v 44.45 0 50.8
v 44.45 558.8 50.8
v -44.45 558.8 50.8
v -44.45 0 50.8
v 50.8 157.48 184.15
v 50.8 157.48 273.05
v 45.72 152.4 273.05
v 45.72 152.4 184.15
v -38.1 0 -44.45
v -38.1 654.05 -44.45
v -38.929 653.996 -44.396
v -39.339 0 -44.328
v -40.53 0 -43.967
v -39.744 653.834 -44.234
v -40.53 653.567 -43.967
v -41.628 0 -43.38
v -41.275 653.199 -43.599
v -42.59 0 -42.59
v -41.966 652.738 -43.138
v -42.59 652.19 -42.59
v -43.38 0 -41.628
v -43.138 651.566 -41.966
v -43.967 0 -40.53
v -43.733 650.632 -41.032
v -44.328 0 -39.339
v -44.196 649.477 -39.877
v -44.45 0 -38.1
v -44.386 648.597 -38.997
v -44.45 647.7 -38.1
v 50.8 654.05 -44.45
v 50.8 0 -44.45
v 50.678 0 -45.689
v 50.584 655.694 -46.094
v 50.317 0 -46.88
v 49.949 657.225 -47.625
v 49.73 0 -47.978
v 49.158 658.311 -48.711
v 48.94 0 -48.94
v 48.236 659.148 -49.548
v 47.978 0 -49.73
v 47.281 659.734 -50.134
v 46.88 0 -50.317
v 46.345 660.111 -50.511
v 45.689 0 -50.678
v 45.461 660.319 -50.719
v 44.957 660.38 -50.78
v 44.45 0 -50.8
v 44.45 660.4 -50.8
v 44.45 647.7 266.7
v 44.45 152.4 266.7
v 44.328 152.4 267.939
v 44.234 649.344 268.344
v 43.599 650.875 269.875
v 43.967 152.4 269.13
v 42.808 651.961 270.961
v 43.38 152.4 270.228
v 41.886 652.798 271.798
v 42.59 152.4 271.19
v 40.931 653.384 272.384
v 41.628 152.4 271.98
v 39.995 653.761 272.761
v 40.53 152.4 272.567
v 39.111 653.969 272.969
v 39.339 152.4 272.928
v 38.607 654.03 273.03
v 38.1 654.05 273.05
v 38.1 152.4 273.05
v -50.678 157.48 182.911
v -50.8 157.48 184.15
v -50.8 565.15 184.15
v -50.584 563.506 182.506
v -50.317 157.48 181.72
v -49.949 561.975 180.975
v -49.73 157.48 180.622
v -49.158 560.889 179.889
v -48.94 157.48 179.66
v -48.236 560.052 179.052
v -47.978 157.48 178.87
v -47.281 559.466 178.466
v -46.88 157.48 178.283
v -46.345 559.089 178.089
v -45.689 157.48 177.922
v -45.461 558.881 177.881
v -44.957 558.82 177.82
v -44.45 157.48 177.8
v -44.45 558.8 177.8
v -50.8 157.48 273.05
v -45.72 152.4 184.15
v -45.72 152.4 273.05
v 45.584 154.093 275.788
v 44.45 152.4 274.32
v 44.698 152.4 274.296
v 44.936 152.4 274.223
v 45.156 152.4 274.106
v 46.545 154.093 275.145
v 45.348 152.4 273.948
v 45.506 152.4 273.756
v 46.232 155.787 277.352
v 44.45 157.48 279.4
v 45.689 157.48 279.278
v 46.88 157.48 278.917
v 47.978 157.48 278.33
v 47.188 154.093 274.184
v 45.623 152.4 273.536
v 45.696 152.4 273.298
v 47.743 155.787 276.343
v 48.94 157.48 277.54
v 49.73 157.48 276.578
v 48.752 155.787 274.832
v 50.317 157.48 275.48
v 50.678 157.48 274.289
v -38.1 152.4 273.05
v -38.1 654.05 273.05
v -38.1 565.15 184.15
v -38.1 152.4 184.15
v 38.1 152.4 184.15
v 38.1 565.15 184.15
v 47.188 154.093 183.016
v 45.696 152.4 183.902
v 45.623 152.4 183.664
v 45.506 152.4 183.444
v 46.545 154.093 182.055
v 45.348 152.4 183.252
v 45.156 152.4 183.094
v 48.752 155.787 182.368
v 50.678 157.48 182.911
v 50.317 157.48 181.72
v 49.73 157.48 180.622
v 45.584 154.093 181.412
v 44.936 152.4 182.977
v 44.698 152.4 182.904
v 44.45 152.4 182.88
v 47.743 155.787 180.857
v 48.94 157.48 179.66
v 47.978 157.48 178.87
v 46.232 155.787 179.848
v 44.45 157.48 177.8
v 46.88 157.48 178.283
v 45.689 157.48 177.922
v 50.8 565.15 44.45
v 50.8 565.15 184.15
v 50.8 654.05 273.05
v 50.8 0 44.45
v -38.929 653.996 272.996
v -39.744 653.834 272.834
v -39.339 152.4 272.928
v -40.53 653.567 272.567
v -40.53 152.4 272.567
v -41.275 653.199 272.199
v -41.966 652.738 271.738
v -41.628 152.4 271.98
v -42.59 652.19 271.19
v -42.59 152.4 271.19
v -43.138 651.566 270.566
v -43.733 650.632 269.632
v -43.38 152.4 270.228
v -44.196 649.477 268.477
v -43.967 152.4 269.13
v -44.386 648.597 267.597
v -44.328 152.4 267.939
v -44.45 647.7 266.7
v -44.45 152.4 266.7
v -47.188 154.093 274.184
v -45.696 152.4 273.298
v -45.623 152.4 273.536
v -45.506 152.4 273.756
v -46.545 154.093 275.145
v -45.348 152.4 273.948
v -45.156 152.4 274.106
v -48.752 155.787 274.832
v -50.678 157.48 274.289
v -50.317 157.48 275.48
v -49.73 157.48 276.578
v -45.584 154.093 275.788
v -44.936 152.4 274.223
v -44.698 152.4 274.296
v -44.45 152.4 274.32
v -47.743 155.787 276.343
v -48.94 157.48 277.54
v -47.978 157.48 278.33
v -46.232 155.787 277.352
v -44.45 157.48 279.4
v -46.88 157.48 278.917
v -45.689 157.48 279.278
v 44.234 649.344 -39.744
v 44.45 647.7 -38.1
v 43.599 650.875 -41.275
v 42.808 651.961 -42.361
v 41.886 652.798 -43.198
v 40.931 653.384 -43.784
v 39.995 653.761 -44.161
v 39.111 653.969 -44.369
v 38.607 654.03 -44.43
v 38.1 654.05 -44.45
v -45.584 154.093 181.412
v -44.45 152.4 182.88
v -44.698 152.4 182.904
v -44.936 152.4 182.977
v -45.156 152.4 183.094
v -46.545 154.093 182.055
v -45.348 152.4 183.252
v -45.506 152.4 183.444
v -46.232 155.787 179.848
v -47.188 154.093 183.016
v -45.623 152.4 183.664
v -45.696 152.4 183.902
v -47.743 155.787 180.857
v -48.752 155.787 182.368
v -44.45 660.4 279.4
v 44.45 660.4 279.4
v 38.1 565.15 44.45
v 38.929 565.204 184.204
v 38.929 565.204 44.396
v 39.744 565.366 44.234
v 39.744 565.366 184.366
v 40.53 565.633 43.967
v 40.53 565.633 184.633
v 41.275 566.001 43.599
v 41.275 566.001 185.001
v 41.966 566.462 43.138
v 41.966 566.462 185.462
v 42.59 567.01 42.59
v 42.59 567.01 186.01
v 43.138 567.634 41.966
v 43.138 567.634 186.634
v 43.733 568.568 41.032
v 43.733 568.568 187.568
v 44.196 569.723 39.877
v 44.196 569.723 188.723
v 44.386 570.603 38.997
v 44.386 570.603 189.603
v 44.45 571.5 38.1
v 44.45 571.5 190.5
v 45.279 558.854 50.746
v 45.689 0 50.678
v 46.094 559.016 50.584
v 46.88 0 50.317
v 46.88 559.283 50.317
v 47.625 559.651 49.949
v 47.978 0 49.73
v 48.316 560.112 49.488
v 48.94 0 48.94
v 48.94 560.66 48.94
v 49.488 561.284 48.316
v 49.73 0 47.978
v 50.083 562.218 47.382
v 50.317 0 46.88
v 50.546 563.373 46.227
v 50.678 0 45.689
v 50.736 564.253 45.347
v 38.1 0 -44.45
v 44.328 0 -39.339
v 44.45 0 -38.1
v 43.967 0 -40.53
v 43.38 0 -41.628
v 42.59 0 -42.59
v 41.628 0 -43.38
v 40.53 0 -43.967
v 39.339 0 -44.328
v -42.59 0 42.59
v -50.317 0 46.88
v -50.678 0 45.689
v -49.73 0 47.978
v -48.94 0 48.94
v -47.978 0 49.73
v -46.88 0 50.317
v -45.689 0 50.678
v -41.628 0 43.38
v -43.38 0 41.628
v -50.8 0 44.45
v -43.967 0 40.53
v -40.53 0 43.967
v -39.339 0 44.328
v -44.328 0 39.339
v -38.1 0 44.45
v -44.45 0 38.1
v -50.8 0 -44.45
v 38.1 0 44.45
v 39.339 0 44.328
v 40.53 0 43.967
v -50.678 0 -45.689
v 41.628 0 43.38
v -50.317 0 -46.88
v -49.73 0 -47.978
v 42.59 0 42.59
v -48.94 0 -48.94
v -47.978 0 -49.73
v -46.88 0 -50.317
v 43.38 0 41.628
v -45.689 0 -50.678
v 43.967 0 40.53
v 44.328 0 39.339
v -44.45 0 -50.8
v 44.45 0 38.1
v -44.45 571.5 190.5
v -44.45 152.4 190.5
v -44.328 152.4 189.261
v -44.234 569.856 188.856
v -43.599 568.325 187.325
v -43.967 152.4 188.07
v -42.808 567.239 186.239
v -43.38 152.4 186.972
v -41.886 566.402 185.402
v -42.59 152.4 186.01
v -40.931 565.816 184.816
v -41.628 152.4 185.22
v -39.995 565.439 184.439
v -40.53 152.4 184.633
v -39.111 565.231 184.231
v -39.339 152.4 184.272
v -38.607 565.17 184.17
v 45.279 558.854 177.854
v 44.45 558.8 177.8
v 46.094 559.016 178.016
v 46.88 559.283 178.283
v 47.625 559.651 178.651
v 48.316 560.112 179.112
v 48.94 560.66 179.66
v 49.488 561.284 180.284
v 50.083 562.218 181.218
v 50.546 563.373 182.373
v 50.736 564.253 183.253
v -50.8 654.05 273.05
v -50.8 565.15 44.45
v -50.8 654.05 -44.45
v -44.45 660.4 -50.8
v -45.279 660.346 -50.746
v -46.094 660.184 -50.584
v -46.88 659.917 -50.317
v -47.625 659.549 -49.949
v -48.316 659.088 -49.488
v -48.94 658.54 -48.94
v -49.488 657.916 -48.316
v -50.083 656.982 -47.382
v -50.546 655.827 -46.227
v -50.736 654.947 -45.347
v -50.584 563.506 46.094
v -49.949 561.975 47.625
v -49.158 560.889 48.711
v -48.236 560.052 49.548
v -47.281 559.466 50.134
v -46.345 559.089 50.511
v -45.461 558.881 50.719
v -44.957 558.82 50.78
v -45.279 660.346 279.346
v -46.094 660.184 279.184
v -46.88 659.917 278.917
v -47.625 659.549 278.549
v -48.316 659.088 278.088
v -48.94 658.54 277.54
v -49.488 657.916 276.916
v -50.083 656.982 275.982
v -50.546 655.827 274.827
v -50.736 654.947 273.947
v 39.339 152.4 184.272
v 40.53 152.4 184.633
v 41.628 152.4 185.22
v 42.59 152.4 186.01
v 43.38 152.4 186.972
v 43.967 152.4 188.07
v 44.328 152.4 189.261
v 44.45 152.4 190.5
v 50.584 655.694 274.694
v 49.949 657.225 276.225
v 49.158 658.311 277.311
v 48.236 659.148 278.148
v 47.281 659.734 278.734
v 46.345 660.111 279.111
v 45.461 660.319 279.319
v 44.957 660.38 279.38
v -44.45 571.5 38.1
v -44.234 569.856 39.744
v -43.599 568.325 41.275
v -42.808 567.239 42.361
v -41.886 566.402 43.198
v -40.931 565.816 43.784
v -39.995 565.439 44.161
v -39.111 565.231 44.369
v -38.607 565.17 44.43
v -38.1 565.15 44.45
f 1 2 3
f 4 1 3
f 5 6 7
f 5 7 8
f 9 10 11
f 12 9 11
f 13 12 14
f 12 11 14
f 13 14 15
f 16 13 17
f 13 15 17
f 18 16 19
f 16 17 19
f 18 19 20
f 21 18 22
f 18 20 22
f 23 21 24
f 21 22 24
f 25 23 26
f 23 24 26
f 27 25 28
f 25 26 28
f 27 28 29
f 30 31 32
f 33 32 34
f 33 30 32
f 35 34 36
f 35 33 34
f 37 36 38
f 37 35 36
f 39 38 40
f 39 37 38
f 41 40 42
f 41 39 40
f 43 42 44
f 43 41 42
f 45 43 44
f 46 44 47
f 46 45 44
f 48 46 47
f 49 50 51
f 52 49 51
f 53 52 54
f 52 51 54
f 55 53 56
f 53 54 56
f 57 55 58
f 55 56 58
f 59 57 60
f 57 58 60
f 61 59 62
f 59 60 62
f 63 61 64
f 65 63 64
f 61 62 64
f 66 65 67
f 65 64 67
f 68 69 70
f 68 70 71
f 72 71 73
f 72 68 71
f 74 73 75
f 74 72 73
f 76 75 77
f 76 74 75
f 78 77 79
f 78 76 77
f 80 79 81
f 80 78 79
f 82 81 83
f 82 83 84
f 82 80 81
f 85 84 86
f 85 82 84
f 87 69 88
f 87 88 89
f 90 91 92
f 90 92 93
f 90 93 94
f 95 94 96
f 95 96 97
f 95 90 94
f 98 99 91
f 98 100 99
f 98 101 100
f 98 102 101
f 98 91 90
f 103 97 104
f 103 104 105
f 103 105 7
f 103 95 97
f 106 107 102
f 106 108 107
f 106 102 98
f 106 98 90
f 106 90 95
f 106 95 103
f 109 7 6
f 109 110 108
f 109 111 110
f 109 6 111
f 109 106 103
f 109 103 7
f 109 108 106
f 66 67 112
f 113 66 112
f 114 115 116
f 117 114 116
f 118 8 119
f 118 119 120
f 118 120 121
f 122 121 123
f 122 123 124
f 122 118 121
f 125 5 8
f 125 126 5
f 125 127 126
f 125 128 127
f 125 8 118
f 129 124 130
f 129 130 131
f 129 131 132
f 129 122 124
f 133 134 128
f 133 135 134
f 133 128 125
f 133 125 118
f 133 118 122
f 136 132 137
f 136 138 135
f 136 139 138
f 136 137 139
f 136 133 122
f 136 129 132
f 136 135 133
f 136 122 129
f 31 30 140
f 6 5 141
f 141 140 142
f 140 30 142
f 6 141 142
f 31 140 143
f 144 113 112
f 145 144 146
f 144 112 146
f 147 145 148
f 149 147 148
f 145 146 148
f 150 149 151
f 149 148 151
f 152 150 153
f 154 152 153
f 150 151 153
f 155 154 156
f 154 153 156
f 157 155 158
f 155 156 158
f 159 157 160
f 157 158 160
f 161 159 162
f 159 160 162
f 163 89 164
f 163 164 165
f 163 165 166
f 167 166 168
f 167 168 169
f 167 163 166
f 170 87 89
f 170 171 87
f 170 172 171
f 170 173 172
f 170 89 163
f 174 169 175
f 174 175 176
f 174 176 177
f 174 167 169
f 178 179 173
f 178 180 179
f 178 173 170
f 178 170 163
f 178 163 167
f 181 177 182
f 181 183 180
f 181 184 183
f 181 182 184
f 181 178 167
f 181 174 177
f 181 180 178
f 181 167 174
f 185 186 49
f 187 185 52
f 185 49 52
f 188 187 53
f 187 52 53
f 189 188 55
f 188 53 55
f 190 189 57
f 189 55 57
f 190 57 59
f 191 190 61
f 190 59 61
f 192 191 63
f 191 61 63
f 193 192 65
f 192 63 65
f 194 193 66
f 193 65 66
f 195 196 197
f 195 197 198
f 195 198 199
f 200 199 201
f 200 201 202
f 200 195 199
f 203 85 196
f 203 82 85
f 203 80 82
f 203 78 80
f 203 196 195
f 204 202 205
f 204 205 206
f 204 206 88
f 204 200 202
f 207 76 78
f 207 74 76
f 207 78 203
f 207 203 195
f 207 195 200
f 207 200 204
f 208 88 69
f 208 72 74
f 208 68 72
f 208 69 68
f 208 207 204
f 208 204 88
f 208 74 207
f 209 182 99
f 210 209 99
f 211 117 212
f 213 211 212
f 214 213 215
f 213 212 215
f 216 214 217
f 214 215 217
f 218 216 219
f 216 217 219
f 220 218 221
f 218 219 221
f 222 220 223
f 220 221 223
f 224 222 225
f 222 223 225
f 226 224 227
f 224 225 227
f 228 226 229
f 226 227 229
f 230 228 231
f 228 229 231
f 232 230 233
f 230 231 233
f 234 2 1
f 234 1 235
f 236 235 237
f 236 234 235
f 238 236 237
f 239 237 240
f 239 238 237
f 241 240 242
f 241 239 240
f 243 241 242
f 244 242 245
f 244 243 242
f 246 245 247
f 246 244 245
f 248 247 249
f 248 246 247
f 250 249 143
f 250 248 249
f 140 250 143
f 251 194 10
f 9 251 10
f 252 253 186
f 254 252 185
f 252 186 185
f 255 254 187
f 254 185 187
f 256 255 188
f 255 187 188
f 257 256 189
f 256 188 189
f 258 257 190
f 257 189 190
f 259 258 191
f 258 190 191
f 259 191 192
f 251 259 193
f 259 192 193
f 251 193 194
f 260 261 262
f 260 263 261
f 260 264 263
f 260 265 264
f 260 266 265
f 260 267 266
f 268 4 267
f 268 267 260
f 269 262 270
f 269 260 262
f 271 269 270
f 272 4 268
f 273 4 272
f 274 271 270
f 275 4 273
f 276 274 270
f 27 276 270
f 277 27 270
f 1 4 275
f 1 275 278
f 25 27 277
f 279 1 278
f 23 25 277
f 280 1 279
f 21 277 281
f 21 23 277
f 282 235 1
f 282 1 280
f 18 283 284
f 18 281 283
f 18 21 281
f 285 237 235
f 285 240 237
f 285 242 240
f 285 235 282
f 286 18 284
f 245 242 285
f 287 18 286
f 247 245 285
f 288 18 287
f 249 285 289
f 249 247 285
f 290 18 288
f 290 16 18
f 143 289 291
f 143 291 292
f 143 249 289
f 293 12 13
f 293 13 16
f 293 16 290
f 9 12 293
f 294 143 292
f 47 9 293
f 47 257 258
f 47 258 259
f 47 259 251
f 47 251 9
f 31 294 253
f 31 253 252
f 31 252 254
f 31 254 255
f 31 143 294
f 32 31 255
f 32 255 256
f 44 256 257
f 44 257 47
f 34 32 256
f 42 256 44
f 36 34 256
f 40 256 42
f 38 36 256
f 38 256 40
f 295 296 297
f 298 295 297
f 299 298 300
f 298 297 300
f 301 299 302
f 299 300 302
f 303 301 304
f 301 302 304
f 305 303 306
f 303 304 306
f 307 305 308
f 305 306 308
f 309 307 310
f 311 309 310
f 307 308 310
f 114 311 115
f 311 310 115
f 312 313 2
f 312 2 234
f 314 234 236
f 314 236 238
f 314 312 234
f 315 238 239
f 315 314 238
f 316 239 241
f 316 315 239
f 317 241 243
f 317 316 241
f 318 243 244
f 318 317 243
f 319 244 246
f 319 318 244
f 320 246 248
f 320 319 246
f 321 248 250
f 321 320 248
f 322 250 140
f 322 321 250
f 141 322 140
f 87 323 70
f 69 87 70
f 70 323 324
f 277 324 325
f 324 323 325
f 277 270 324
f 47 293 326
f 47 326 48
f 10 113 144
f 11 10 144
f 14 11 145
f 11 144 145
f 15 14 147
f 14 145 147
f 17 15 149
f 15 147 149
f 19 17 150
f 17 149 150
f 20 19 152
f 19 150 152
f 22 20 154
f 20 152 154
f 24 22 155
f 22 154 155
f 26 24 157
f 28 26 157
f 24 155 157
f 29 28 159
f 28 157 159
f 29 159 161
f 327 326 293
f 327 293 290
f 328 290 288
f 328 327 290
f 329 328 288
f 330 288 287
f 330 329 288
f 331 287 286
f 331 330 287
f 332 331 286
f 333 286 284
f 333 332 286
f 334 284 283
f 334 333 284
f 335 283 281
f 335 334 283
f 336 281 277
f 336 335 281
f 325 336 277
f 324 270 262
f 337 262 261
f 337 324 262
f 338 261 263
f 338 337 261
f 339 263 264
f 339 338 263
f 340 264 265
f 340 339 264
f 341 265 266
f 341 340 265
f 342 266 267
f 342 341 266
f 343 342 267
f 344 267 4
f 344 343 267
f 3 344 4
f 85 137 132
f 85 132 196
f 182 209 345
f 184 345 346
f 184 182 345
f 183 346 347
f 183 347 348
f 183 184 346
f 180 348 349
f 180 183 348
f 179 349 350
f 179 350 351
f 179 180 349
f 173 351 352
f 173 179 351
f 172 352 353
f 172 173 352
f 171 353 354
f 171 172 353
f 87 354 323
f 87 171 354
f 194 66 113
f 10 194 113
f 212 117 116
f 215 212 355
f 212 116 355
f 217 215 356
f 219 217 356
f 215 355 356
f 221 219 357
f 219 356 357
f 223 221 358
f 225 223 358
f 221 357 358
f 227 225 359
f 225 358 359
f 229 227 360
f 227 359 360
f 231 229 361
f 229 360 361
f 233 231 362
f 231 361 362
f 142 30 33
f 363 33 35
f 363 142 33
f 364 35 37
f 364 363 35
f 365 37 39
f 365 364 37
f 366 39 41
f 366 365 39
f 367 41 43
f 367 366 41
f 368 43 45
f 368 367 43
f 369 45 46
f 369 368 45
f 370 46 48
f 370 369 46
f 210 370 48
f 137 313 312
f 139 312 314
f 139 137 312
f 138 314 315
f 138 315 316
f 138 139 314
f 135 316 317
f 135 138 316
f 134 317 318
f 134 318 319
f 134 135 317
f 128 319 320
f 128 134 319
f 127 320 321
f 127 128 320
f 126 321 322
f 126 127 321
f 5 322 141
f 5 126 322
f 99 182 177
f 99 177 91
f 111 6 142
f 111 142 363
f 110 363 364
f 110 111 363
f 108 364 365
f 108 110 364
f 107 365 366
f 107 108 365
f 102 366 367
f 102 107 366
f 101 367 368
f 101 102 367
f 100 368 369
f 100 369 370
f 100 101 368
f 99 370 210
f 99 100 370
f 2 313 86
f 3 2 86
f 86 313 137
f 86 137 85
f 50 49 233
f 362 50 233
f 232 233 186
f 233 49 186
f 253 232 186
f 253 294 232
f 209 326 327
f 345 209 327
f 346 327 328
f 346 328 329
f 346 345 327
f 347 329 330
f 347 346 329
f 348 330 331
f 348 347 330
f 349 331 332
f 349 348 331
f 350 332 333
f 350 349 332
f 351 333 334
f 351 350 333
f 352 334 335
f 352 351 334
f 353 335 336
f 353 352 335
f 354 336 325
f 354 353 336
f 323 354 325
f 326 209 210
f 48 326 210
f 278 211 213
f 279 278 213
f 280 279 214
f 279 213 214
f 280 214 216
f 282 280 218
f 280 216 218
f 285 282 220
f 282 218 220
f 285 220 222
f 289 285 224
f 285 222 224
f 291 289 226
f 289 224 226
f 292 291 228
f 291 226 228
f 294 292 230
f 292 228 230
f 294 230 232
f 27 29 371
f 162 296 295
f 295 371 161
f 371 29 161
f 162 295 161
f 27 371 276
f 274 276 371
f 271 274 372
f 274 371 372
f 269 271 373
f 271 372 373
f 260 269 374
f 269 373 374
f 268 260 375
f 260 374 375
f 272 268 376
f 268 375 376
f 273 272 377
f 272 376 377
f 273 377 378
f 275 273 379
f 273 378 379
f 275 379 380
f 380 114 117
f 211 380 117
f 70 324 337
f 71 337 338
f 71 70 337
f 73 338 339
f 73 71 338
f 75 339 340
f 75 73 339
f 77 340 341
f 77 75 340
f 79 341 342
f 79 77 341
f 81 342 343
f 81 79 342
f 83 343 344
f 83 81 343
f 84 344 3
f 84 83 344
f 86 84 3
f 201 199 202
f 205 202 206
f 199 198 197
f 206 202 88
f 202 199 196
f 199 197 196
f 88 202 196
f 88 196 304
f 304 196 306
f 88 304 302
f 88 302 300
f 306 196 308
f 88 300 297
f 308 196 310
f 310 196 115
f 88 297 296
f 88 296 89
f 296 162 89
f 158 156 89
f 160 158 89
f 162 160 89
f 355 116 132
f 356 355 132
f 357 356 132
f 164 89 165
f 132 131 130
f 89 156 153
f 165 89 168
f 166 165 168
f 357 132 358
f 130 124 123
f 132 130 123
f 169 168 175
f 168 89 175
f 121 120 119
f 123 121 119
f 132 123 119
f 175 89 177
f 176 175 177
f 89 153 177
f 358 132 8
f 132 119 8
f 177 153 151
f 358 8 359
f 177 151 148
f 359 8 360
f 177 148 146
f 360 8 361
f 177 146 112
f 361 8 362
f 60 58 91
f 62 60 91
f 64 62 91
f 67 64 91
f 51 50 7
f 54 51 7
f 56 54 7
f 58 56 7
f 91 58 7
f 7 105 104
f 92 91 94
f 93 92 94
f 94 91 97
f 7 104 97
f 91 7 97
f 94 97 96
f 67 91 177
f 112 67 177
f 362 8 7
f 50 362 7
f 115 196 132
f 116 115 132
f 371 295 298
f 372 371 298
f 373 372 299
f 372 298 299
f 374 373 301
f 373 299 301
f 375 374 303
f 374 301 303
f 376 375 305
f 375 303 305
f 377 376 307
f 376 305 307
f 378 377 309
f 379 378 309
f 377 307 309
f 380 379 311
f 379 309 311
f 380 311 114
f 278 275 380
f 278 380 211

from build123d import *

# Parameters (mm, degrees)
F3_SIZE = 5.08


with BuildPart() as f2:
    # F2: sweep along a path in F1
    with BuildLine(Plane.YZ) as f2_path:
        Line((0, 0), (609.6, 0))
        Line((609.6, 0), (609.6, 228.6))
        Line((609.6, 228.6), (152.4, 228.6))
    # F0 (on Front) → F2 (sweep)
    with BuildSketch(Plane.XZ):
        with BuildLine():
            ThreePointArc((50.8, 44.45), (48.9401280605, 48.9401280605), (44.45, 50.8))
            Line((44.45, 50.8), (-44.45, 50.8))
            ThreePointArc((-44.45, 50.8), (-48.9401280605, 48.9401280605), (-50.8, 44.45))
            Line((-50.8, 44.45), (-50.8, -44.45))
            ThreePointArc((-50.8, -44.45), (-48.9401280605, -48.9401280605), (-44.45, -50.8))
            Line((-44.45, -50.8), (44.45, -50.8))
            ThreePointArc((44.45, -50.8), (48.9401280605, -48.9401280605), (50.8, -44.45))
            Line((50.8, -44.45), (50.8, 44.45))
        make_face()
        with BuildLine():
            Line((-38.1, 44.45), (38.1, 44.45))
            ThreePointArc((38.1, 44.45), (42.5901280605, 42.5901280605), (44.45, 38.1))
            Line((44.45, 38.1), (44.45, -38.1))
            ThreePointArc((44.45, -38.1), (42.5901280605, -42.5901280605), (38.1, -44.45))
            Line((38.1, -44.45), (-38.1, -44.45))
            ThreePointArc((-38.1, -44.45), (-42.5901280605, -42.5901280605), (-44.45, -38.1))
            Line((-44.45, -38.1), (-44.45, 38.1))
            ThreePointArc((-44.45, 38.1), (-42.5901280605, 42.5901280605), (-38.1, 44.45))
        make_face(mode=Mode.SUBTRACT)
    sweep(path=f2_path.line, transition=Transition.RIGHT)

    # F3
    f3_edges = [f2.edges().sort_by_distance(p)[0] for p in [
        (0, 152.4, 279.4),
    ]]
    chamfer(f3_edges, length=F3_SIZE)


solid = f2.part
